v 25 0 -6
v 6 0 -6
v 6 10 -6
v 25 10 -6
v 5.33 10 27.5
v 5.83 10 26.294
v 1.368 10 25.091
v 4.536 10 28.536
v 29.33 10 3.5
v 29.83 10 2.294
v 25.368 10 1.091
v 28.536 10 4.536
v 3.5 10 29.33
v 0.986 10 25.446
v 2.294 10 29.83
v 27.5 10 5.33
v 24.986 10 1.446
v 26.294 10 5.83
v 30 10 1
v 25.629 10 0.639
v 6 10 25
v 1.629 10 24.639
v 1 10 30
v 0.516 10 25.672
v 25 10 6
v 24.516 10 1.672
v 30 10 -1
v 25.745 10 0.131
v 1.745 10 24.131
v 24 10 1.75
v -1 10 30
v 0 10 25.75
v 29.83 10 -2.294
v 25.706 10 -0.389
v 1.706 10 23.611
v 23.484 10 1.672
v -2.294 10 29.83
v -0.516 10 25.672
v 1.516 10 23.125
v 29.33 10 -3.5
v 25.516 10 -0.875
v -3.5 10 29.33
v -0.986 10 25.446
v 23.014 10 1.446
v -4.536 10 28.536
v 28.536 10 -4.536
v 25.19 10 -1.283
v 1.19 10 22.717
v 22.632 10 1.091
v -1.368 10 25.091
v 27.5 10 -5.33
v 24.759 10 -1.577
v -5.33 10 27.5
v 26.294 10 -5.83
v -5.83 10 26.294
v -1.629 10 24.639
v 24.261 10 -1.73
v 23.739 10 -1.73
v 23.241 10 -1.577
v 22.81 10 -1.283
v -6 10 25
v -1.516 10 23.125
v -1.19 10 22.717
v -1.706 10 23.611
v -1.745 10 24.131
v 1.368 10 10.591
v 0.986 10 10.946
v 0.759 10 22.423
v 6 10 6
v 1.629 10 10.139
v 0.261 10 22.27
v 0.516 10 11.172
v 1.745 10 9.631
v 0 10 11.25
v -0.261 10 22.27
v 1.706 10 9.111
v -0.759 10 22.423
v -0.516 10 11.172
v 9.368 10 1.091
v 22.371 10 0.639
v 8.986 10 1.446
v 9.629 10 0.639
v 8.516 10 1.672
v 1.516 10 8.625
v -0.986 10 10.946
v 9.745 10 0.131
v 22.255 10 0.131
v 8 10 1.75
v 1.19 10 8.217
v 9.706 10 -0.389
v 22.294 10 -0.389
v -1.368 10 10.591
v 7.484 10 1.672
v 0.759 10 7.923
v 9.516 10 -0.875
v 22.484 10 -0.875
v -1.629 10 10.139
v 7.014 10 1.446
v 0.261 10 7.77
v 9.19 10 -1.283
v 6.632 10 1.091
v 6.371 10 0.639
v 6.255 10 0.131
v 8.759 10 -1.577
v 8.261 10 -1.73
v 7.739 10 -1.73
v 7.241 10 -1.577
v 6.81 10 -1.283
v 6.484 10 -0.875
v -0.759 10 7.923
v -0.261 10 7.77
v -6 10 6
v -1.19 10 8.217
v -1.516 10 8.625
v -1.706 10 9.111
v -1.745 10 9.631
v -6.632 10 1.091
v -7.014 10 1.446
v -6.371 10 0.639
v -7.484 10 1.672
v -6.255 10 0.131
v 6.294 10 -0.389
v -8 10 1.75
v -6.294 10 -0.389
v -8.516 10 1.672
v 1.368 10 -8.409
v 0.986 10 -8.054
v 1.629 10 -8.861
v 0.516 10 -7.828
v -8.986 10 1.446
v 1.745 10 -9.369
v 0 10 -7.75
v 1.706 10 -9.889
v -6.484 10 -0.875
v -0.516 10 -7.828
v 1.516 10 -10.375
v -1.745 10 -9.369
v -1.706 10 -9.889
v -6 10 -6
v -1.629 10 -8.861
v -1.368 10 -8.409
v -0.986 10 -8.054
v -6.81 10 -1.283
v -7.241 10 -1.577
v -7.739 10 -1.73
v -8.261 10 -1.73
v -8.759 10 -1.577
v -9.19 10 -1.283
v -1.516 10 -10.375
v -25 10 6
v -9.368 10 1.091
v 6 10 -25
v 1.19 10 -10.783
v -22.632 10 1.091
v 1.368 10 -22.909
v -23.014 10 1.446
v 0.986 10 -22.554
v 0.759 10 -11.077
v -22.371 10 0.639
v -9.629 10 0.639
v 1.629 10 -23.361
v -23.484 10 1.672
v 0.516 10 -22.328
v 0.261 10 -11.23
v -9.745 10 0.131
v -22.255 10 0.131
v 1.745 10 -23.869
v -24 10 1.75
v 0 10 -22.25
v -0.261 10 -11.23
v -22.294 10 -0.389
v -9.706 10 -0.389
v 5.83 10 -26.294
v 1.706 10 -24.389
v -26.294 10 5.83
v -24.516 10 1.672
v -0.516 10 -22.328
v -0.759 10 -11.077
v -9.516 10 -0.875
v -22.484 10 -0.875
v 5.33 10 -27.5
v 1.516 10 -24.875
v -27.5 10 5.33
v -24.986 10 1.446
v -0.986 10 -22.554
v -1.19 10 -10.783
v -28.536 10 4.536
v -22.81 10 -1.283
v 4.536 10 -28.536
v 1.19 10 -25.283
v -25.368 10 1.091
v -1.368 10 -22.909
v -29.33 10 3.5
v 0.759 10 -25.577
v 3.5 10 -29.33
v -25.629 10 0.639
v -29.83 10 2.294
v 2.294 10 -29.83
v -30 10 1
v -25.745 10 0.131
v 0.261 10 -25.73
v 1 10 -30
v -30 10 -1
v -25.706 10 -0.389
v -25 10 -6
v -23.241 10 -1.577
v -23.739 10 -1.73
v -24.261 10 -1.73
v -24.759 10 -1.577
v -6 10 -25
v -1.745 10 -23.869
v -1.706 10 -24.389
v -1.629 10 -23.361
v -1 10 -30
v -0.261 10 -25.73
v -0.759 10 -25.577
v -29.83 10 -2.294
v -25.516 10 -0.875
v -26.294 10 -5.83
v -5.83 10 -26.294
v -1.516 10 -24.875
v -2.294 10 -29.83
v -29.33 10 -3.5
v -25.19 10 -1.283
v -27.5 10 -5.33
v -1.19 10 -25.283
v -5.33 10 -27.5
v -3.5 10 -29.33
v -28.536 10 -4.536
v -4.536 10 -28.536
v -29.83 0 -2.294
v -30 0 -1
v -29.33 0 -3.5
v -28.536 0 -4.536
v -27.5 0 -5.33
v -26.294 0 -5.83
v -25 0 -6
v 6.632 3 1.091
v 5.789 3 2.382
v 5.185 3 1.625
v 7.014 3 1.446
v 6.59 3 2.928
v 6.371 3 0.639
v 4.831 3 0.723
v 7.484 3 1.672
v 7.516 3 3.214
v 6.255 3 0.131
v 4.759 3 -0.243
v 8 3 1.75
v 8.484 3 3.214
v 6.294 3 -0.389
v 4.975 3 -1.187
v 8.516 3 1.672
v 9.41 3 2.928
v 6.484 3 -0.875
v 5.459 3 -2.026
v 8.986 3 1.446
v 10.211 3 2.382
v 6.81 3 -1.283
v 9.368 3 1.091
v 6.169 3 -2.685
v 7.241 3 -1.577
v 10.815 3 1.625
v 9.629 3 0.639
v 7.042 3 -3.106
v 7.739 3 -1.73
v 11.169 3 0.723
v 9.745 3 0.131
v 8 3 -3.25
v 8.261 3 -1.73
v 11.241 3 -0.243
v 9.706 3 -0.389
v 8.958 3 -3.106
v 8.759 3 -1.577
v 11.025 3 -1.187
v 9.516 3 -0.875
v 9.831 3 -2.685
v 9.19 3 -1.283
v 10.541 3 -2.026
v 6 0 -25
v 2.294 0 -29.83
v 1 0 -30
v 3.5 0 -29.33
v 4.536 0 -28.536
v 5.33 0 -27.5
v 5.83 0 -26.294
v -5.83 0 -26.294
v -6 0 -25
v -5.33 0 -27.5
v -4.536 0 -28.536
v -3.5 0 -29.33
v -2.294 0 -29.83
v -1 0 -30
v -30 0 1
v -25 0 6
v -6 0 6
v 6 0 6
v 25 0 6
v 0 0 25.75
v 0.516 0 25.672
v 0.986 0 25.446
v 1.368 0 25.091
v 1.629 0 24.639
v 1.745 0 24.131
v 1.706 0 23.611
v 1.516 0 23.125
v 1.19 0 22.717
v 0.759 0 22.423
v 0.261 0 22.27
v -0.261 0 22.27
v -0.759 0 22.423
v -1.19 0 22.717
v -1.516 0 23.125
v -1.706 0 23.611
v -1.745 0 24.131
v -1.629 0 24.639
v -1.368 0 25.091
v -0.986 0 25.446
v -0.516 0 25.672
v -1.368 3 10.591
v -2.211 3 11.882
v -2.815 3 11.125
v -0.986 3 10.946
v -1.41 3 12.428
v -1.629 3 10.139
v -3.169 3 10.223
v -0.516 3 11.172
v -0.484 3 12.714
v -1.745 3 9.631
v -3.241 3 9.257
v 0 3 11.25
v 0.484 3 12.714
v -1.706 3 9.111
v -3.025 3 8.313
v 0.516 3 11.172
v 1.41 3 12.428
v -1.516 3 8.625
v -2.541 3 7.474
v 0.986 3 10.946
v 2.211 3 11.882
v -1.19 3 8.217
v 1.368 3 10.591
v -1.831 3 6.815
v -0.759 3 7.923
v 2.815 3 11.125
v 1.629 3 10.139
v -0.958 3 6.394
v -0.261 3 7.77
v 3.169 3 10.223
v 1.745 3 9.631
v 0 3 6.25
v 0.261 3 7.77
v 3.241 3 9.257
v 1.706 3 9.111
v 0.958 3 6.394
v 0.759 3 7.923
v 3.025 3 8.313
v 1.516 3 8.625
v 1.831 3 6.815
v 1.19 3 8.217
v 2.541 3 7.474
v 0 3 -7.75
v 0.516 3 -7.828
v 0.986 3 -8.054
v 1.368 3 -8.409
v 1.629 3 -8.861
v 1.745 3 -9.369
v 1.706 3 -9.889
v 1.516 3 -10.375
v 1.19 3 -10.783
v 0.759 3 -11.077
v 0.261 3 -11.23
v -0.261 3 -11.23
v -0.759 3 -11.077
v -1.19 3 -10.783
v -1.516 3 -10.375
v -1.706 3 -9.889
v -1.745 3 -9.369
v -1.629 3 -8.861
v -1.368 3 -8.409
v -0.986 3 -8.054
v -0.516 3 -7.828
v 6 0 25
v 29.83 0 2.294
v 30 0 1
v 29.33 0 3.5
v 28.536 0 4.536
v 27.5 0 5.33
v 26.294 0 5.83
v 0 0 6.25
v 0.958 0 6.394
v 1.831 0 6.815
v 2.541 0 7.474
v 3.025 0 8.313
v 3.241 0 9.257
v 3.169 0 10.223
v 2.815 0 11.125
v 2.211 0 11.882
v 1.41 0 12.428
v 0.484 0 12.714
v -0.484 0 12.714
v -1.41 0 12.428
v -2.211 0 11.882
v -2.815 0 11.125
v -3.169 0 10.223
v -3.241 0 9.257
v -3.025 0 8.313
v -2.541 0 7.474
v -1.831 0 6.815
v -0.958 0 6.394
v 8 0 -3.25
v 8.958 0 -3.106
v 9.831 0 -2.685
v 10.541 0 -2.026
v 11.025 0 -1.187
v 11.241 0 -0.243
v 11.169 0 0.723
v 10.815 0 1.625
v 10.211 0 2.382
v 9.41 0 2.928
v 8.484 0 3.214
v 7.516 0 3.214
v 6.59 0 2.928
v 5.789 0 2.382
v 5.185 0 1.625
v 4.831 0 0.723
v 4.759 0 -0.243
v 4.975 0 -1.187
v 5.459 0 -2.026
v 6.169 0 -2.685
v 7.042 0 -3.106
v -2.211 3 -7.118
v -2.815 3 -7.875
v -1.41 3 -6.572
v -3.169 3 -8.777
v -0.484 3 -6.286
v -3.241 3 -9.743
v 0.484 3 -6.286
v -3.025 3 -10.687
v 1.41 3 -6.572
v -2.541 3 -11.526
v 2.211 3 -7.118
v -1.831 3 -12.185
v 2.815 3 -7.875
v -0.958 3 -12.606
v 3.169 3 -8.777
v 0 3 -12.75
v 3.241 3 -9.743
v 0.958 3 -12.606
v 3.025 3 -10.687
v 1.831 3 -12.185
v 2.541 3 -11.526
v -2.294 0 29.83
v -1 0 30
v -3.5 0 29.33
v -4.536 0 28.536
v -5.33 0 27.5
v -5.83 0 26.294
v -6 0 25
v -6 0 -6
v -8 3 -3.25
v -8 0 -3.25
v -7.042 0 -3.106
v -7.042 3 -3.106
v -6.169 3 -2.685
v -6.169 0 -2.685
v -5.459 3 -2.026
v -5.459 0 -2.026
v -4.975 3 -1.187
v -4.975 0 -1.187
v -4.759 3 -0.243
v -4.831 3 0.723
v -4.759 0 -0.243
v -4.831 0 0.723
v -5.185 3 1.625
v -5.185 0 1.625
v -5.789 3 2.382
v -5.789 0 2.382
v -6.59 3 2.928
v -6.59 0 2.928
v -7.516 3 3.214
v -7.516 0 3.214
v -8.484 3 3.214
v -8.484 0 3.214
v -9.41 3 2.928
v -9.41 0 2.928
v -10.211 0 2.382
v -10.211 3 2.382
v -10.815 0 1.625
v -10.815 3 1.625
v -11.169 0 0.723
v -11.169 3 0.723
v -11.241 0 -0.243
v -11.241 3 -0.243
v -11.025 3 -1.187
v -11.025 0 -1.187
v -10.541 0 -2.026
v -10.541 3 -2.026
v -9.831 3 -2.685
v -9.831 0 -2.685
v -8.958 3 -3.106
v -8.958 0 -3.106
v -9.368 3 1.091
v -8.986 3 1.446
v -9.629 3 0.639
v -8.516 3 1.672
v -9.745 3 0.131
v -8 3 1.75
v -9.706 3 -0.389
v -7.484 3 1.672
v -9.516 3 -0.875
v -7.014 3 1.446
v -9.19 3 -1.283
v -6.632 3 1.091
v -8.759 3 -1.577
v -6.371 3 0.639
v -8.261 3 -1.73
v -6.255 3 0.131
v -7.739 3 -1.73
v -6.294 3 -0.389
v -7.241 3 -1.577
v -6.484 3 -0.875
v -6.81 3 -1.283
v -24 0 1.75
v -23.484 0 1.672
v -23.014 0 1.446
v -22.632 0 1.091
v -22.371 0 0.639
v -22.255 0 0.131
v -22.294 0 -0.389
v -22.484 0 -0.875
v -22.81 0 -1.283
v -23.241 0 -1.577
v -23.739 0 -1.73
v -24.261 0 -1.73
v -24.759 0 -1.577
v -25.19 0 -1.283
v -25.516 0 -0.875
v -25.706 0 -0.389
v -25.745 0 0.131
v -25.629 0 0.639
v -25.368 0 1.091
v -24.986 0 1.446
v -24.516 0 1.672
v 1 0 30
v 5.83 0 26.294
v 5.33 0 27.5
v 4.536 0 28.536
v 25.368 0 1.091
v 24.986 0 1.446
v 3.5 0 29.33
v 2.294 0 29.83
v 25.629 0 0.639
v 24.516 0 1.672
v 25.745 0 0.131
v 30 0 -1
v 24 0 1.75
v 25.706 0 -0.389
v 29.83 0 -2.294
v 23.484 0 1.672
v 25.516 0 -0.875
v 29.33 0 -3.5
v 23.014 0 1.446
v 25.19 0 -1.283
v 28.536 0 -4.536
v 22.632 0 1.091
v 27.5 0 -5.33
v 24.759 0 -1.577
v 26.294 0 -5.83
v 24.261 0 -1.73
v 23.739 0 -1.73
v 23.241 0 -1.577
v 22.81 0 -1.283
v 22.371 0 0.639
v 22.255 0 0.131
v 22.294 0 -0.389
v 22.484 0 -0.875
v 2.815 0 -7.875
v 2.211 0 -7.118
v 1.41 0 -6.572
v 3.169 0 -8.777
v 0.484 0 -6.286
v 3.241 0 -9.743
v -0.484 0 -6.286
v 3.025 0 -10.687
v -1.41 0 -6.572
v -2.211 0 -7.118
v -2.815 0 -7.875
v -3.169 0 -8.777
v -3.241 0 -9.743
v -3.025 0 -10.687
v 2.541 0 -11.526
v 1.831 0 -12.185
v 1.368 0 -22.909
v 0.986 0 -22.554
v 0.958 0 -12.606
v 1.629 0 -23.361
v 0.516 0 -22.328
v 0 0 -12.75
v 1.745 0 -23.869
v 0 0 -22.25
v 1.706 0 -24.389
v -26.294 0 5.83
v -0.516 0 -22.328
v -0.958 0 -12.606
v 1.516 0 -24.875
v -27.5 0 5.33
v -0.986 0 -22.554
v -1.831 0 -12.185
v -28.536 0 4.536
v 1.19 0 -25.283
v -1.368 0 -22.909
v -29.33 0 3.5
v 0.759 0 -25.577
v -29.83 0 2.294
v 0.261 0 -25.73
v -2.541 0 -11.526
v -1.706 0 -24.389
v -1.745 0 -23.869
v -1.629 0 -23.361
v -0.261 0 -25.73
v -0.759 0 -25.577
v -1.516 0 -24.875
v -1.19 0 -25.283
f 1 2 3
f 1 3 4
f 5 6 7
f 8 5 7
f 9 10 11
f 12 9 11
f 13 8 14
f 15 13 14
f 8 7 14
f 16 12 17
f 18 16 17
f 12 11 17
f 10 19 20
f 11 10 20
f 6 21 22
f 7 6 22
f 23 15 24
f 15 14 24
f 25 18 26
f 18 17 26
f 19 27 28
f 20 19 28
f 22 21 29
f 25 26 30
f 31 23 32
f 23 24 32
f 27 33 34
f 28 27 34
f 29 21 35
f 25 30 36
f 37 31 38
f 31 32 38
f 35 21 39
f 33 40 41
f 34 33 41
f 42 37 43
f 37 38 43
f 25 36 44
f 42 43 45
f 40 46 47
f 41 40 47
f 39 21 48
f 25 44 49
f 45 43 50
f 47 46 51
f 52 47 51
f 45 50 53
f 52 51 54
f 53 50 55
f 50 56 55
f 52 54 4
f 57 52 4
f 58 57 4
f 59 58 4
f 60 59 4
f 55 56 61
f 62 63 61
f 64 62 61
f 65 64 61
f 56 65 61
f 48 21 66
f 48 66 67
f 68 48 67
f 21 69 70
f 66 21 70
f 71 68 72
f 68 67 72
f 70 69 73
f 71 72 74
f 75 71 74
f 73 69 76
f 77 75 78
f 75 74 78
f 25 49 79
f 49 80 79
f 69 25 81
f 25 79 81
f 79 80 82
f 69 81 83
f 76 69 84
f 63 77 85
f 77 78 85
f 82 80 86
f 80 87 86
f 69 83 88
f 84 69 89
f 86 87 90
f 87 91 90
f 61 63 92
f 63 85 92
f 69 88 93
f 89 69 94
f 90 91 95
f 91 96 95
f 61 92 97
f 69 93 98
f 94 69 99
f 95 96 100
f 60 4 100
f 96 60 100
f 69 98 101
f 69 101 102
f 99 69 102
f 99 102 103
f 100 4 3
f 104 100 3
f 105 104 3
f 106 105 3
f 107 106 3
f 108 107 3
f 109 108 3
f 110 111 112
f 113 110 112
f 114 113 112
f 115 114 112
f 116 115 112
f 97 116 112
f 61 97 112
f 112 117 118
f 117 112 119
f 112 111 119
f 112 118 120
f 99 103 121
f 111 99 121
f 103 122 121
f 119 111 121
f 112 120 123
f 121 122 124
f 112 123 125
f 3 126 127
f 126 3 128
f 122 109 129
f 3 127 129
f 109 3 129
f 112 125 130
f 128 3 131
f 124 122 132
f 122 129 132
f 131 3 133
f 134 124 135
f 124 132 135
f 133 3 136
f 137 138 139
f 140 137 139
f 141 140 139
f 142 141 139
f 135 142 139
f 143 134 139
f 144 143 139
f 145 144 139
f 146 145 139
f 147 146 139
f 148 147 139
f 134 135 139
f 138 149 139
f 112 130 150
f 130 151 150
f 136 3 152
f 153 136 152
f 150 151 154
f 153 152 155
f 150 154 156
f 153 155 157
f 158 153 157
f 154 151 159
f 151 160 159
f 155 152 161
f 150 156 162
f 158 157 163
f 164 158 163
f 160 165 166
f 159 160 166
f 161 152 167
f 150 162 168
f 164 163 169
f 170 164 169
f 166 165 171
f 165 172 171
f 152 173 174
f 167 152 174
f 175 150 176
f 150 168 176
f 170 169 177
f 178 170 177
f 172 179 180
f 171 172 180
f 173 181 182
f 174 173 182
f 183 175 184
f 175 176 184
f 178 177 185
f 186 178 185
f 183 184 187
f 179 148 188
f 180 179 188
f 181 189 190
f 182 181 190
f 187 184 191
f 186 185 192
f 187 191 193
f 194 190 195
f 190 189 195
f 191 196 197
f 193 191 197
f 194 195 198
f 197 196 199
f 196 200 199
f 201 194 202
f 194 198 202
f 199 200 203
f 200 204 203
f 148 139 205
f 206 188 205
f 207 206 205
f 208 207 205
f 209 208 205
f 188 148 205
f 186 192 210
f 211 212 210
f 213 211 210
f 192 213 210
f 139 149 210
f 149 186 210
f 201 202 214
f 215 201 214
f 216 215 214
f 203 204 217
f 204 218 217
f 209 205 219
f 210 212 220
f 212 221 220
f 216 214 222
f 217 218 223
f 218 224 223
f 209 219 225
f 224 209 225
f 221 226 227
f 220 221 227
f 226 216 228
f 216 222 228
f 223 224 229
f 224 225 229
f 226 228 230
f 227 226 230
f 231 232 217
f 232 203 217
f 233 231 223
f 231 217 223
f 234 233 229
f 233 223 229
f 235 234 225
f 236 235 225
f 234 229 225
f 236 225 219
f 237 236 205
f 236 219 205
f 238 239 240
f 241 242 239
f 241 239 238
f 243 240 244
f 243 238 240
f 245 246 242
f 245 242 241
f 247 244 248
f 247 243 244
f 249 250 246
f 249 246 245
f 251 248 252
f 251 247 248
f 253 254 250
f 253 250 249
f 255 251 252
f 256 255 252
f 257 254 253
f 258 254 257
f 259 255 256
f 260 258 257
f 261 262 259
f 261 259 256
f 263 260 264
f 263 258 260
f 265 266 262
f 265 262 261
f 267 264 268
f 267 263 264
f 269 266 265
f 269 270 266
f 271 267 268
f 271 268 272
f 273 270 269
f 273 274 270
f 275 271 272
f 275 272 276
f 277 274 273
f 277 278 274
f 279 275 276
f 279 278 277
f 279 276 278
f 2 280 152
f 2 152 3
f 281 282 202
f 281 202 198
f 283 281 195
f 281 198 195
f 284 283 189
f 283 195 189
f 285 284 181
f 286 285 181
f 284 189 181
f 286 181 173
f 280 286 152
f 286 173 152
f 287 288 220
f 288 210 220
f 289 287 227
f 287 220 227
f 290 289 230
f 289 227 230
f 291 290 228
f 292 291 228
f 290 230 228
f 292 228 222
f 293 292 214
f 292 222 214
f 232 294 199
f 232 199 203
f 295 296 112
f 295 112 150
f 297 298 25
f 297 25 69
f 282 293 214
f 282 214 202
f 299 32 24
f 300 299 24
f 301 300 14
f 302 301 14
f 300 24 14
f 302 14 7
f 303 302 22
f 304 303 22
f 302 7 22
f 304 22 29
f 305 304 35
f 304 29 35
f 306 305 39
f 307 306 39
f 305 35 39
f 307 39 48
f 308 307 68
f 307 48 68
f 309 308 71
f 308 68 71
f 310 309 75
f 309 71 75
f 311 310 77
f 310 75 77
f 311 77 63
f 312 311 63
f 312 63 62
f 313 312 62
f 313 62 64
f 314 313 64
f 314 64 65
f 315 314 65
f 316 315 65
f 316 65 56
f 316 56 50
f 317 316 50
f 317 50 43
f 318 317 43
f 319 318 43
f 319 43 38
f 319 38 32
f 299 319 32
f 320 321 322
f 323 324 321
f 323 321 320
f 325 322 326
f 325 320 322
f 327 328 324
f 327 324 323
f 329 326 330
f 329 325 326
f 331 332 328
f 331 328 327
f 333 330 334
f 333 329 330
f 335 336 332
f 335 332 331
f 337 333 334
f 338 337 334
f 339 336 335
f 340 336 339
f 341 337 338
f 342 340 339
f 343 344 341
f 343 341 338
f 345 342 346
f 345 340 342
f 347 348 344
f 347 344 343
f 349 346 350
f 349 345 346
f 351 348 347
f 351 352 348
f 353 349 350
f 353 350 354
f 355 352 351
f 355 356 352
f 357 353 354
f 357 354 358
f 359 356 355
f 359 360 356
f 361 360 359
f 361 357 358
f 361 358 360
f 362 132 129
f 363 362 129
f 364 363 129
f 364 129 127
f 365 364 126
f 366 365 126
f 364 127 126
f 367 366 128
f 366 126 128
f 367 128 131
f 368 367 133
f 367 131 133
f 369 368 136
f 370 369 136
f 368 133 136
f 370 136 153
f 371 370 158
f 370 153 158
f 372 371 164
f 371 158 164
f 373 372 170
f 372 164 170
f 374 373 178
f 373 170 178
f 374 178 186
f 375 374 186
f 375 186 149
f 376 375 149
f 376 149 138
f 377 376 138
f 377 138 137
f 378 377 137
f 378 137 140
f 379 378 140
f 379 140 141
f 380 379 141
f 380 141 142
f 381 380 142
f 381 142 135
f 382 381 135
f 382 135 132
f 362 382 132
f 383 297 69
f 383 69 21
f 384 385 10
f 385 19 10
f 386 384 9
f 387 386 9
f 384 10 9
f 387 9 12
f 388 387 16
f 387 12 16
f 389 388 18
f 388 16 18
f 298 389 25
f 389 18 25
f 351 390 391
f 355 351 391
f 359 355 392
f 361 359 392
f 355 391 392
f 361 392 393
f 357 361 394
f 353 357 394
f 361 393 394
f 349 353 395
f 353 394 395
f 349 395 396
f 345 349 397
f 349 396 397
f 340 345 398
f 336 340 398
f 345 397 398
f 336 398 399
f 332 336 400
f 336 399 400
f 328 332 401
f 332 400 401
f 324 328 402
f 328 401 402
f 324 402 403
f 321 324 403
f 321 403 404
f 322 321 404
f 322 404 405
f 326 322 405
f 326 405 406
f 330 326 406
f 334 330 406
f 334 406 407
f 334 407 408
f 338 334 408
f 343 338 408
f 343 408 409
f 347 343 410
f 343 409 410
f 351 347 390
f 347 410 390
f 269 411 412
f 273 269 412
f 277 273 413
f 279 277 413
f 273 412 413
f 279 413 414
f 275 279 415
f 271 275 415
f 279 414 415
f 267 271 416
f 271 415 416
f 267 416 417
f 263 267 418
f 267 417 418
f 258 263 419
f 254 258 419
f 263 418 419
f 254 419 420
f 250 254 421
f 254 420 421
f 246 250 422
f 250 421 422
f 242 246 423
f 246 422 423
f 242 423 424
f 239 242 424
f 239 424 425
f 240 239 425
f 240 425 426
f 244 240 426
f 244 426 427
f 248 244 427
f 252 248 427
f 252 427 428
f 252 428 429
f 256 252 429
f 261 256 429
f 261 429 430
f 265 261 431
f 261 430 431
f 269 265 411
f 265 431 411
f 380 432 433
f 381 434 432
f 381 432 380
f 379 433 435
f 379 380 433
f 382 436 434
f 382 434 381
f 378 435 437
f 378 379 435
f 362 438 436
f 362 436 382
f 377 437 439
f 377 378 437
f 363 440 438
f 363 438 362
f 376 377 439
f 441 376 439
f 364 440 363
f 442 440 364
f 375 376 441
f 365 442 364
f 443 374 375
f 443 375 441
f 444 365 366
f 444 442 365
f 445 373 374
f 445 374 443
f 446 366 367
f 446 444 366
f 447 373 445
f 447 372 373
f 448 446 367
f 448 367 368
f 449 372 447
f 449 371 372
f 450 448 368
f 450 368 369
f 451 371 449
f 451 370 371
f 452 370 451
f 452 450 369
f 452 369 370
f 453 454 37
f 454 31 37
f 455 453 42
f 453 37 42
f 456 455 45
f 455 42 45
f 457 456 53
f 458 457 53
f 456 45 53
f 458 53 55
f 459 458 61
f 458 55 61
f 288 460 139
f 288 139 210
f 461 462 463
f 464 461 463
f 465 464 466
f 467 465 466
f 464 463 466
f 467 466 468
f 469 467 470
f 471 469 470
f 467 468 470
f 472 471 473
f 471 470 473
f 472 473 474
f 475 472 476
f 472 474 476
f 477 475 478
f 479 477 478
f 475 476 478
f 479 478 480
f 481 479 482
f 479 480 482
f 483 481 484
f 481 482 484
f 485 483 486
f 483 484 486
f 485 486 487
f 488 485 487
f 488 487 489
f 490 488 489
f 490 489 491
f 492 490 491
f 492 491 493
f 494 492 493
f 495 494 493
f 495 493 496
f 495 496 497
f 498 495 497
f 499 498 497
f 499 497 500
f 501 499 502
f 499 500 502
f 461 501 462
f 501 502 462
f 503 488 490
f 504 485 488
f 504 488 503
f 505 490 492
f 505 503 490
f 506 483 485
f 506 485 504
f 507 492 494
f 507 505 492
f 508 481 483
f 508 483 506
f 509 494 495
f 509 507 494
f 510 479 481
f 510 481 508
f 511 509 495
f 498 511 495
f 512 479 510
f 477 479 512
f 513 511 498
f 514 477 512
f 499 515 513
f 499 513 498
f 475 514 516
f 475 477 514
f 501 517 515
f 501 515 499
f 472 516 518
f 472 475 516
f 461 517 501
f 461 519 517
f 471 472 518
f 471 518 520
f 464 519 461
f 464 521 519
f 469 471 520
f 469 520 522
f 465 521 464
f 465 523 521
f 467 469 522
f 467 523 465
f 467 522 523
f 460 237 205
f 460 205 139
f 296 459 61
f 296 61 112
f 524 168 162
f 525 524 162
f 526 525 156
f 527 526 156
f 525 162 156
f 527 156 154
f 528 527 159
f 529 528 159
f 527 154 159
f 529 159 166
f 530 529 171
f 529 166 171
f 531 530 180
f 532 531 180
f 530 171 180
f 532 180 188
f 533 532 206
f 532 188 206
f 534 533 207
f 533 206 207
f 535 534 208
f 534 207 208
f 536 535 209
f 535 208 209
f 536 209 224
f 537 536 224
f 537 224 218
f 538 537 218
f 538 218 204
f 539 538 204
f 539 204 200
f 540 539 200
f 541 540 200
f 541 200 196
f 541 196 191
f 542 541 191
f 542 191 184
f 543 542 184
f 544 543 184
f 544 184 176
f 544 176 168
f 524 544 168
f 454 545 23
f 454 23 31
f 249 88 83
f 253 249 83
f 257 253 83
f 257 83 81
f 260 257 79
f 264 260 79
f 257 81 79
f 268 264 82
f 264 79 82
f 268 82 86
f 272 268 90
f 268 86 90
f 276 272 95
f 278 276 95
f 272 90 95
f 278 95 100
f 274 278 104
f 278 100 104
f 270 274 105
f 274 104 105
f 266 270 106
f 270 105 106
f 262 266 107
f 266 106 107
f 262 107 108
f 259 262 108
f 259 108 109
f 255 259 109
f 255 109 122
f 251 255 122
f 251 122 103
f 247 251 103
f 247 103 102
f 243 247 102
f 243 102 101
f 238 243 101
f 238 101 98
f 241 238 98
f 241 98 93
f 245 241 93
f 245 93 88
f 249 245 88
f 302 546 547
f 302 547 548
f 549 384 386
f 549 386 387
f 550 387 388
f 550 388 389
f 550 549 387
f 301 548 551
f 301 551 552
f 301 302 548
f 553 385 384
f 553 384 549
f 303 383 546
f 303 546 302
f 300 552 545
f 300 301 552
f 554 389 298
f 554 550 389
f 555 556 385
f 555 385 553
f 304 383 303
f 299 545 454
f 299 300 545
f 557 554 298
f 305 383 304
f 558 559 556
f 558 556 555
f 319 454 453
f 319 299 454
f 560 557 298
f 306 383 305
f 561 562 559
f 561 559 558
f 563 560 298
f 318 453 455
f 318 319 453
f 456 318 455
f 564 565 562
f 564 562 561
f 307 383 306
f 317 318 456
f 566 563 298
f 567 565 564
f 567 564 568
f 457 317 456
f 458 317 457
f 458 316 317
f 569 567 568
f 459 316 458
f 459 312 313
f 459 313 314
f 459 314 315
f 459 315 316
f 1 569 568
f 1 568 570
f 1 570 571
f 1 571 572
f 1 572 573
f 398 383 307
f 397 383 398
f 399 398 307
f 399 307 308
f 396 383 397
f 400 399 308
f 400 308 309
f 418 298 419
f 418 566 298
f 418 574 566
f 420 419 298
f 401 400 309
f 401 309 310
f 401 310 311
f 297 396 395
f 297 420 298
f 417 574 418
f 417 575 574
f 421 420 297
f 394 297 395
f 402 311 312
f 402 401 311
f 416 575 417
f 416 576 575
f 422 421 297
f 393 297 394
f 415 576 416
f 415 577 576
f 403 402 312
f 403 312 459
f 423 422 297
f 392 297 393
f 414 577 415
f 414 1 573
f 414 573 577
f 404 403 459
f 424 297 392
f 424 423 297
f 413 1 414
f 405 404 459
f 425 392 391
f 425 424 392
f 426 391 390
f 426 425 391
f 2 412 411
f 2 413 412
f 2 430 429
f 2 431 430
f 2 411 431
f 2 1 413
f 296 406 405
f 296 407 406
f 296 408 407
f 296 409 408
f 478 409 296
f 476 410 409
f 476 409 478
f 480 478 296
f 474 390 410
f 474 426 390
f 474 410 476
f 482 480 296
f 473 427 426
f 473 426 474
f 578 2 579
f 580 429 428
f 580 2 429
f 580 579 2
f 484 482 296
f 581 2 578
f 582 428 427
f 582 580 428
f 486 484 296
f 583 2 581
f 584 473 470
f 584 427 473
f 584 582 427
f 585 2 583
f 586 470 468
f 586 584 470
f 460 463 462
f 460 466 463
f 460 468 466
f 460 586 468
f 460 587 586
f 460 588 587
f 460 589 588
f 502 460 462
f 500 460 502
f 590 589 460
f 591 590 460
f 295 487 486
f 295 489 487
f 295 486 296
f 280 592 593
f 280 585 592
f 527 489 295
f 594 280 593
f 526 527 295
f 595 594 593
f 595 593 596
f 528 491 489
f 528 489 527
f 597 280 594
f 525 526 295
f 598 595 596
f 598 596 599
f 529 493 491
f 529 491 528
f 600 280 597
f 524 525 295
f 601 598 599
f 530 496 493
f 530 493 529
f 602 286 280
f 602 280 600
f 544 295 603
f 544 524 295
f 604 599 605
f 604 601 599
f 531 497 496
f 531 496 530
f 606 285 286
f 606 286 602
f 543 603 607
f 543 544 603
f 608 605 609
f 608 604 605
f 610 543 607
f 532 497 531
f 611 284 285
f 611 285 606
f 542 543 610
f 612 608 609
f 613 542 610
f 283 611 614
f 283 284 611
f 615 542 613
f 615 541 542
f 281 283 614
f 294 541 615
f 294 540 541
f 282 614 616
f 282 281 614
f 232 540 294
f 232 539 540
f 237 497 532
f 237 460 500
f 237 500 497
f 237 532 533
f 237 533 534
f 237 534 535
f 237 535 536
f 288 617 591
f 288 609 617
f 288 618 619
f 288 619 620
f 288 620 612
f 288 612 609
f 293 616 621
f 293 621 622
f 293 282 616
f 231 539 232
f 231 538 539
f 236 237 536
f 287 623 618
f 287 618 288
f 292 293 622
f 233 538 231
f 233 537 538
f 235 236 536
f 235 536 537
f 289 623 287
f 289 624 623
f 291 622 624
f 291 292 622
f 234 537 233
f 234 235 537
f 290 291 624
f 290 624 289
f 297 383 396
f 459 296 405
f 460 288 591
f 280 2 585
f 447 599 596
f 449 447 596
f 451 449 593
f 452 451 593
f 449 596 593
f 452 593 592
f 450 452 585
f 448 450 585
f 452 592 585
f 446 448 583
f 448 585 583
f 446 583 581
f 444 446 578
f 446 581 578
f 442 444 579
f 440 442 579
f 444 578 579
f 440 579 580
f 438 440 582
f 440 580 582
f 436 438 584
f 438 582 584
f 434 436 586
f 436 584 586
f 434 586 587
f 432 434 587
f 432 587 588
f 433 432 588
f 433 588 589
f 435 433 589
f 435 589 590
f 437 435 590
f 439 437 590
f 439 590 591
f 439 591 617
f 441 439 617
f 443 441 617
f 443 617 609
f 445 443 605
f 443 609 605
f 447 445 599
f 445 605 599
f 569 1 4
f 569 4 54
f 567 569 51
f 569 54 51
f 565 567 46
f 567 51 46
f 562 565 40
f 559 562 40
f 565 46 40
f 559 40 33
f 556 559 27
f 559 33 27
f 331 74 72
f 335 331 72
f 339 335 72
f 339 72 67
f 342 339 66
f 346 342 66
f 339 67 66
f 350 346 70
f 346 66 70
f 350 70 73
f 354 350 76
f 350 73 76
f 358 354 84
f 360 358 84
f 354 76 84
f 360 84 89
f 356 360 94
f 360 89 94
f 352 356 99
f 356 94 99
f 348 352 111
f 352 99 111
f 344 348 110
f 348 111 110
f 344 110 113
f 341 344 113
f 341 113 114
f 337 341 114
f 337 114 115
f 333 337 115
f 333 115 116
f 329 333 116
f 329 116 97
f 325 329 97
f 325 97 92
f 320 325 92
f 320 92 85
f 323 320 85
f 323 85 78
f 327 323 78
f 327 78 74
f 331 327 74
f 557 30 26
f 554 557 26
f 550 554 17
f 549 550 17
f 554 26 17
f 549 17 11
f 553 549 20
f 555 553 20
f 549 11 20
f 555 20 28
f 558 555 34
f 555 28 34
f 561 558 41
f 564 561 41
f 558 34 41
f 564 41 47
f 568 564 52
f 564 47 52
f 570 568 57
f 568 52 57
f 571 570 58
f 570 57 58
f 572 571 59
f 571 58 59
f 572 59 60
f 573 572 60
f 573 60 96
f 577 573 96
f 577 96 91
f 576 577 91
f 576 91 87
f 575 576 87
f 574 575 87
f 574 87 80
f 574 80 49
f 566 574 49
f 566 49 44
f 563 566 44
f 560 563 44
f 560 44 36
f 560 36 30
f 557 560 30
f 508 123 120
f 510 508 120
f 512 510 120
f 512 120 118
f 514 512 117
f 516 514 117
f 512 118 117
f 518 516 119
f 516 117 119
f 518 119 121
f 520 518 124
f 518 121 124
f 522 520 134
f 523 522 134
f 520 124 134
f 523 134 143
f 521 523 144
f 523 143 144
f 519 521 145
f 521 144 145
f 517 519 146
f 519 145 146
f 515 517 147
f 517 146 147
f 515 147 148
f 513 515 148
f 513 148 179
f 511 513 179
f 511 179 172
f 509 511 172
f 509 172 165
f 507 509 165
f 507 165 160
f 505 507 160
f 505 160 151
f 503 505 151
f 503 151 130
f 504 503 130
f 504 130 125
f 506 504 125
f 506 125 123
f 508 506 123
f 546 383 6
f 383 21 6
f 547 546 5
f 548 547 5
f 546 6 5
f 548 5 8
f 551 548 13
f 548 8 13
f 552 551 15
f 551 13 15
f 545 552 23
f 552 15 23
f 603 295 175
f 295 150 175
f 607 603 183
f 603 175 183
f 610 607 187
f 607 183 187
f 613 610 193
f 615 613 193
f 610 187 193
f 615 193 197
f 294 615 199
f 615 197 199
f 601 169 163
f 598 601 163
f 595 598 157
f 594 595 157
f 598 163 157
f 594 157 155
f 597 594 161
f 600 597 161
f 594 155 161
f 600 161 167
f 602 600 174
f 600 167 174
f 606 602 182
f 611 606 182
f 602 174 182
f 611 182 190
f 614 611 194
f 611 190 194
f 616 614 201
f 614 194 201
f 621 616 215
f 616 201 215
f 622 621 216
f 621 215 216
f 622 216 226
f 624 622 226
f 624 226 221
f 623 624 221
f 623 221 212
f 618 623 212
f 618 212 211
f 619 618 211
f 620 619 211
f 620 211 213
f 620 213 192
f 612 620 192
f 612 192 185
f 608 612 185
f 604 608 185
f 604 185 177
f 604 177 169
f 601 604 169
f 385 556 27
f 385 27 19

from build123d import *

# Parameters (mm, degrees)
BOSS_EXTRUDE1_DEPTH = 10
FILLET1_R           = 5
SKETCH2_R           = 1.75
CUT_EXTRUDE1_DEPTH  = 15
SKETCH3_R           = 1.75
CUT_EXTRUDE2_DEPTH  = 15
SKETCH4_R           = 3.25
CUT_EXTRUDE3_DEPTH  = 3


with BuildPart() as part:
    # Sketch1 → Boss-Extrude1 (new body)
    with BuildSketch(Plane(origin=(0, 0, 0), x_dir=(1, 0, 0), z_dir=(0, 1, 0))):
        Polygon((6, 6), (30, 6), (30, -6), (6, -6), (6, -30), (-6, -30), (-6, -6), (-30, -6), (-30, 6), (-6, 6), (-6, 30), (6, 30), align=None)
    extrude(amount=BOSS_EXTRUDE1_DEPTH)

    # Fillet1
    fillet1_edges = [part.edges().sort_by_distance(p)[0] for p in [
        (30, 5, -6),
        (30, 5, 6),
        (6, 5, 30),
        (-6, 5, 30),
        (-30, 5, 6),
        (-30, 5, -6),
        (-6, 5, -30),
        (6, 5, -30),
    ]]
    fillet(fillet1_edges, radius=FILLET1_R)

    # Sketch2 → Cut-Extrude1 (cut)
    with BuildSketch(Plane(origin=(0, 10, 0), x_dir=(1, 0, 0), z_dir=(0, 1, 0))):
        with Locations(Location((-8, 0, 0), (0, 0, 270))):
            Circle(SKETCH2_R)
        with Locations(Location((8, 0, 0), (0, 0, 270))):
            Circle(SKETCH2_R)
        with Locations(Location((0, 9.5, 0), (0, 0, 270))):
            Circle(SKETCH2_R)
        with Locations(Location((0, -9.5, 0), (0, 0, 270))):
            Circle(SKETCH2_R)
    extrude(amount=-CUT_EXTRUDE1_DEPTH, mode=Mode.SUBTRACT)

    # Sketch3 → Cut-Extrude2 (cut)
    with BuildSketch(Plane(origin=(0, 10, 0), x_dir=(1, 0, 0), z_dir=(0, 1, 0))):
        with Locations(Location((0, 24, 0), (0, 0, 270))):
            Circle(SKETCH3_R)
        with Locations(Location((24, 0, 0), (0, 0, 270))):
            Circle(SKETCH3_R)
        with Locations(Location((-24, 0, 0), (0, 0, 270))):
            Circle(SKETCH3_R)
        with Locations(Location((0, -24, 0), (0, 0, 270))):
            Circle(SKETCH3_R)
    extrude(amount=-CUT_EXTRUDE2_DEPTH, mode=Mode.SUBTRACT)

    # Sketch4 → Cut-Extrude3 (cut)
    with BuildSketch(Plane.XZ):
        with Locations(Location((0, -9.5, 0), (0, 0, 270))):
            Circle(SKETCH4_R)
        with Locations(Location((-8, 0, 0), (0, 0, 270))):
            Circle(SKETCH4_R)
        with Locations(Location((8, 0, 0), (0, 0, 270))):
            Circle(SKETCH4_R)
        with Locations(Location((0, 9.5, 0), (0, 0, 270))):
            Circle(SKETCH4_R)
    extrude(amount=-CUT_EXTRUDE3_DEPTH, mode=Mode.SUBTRACT)


solid = part.part
